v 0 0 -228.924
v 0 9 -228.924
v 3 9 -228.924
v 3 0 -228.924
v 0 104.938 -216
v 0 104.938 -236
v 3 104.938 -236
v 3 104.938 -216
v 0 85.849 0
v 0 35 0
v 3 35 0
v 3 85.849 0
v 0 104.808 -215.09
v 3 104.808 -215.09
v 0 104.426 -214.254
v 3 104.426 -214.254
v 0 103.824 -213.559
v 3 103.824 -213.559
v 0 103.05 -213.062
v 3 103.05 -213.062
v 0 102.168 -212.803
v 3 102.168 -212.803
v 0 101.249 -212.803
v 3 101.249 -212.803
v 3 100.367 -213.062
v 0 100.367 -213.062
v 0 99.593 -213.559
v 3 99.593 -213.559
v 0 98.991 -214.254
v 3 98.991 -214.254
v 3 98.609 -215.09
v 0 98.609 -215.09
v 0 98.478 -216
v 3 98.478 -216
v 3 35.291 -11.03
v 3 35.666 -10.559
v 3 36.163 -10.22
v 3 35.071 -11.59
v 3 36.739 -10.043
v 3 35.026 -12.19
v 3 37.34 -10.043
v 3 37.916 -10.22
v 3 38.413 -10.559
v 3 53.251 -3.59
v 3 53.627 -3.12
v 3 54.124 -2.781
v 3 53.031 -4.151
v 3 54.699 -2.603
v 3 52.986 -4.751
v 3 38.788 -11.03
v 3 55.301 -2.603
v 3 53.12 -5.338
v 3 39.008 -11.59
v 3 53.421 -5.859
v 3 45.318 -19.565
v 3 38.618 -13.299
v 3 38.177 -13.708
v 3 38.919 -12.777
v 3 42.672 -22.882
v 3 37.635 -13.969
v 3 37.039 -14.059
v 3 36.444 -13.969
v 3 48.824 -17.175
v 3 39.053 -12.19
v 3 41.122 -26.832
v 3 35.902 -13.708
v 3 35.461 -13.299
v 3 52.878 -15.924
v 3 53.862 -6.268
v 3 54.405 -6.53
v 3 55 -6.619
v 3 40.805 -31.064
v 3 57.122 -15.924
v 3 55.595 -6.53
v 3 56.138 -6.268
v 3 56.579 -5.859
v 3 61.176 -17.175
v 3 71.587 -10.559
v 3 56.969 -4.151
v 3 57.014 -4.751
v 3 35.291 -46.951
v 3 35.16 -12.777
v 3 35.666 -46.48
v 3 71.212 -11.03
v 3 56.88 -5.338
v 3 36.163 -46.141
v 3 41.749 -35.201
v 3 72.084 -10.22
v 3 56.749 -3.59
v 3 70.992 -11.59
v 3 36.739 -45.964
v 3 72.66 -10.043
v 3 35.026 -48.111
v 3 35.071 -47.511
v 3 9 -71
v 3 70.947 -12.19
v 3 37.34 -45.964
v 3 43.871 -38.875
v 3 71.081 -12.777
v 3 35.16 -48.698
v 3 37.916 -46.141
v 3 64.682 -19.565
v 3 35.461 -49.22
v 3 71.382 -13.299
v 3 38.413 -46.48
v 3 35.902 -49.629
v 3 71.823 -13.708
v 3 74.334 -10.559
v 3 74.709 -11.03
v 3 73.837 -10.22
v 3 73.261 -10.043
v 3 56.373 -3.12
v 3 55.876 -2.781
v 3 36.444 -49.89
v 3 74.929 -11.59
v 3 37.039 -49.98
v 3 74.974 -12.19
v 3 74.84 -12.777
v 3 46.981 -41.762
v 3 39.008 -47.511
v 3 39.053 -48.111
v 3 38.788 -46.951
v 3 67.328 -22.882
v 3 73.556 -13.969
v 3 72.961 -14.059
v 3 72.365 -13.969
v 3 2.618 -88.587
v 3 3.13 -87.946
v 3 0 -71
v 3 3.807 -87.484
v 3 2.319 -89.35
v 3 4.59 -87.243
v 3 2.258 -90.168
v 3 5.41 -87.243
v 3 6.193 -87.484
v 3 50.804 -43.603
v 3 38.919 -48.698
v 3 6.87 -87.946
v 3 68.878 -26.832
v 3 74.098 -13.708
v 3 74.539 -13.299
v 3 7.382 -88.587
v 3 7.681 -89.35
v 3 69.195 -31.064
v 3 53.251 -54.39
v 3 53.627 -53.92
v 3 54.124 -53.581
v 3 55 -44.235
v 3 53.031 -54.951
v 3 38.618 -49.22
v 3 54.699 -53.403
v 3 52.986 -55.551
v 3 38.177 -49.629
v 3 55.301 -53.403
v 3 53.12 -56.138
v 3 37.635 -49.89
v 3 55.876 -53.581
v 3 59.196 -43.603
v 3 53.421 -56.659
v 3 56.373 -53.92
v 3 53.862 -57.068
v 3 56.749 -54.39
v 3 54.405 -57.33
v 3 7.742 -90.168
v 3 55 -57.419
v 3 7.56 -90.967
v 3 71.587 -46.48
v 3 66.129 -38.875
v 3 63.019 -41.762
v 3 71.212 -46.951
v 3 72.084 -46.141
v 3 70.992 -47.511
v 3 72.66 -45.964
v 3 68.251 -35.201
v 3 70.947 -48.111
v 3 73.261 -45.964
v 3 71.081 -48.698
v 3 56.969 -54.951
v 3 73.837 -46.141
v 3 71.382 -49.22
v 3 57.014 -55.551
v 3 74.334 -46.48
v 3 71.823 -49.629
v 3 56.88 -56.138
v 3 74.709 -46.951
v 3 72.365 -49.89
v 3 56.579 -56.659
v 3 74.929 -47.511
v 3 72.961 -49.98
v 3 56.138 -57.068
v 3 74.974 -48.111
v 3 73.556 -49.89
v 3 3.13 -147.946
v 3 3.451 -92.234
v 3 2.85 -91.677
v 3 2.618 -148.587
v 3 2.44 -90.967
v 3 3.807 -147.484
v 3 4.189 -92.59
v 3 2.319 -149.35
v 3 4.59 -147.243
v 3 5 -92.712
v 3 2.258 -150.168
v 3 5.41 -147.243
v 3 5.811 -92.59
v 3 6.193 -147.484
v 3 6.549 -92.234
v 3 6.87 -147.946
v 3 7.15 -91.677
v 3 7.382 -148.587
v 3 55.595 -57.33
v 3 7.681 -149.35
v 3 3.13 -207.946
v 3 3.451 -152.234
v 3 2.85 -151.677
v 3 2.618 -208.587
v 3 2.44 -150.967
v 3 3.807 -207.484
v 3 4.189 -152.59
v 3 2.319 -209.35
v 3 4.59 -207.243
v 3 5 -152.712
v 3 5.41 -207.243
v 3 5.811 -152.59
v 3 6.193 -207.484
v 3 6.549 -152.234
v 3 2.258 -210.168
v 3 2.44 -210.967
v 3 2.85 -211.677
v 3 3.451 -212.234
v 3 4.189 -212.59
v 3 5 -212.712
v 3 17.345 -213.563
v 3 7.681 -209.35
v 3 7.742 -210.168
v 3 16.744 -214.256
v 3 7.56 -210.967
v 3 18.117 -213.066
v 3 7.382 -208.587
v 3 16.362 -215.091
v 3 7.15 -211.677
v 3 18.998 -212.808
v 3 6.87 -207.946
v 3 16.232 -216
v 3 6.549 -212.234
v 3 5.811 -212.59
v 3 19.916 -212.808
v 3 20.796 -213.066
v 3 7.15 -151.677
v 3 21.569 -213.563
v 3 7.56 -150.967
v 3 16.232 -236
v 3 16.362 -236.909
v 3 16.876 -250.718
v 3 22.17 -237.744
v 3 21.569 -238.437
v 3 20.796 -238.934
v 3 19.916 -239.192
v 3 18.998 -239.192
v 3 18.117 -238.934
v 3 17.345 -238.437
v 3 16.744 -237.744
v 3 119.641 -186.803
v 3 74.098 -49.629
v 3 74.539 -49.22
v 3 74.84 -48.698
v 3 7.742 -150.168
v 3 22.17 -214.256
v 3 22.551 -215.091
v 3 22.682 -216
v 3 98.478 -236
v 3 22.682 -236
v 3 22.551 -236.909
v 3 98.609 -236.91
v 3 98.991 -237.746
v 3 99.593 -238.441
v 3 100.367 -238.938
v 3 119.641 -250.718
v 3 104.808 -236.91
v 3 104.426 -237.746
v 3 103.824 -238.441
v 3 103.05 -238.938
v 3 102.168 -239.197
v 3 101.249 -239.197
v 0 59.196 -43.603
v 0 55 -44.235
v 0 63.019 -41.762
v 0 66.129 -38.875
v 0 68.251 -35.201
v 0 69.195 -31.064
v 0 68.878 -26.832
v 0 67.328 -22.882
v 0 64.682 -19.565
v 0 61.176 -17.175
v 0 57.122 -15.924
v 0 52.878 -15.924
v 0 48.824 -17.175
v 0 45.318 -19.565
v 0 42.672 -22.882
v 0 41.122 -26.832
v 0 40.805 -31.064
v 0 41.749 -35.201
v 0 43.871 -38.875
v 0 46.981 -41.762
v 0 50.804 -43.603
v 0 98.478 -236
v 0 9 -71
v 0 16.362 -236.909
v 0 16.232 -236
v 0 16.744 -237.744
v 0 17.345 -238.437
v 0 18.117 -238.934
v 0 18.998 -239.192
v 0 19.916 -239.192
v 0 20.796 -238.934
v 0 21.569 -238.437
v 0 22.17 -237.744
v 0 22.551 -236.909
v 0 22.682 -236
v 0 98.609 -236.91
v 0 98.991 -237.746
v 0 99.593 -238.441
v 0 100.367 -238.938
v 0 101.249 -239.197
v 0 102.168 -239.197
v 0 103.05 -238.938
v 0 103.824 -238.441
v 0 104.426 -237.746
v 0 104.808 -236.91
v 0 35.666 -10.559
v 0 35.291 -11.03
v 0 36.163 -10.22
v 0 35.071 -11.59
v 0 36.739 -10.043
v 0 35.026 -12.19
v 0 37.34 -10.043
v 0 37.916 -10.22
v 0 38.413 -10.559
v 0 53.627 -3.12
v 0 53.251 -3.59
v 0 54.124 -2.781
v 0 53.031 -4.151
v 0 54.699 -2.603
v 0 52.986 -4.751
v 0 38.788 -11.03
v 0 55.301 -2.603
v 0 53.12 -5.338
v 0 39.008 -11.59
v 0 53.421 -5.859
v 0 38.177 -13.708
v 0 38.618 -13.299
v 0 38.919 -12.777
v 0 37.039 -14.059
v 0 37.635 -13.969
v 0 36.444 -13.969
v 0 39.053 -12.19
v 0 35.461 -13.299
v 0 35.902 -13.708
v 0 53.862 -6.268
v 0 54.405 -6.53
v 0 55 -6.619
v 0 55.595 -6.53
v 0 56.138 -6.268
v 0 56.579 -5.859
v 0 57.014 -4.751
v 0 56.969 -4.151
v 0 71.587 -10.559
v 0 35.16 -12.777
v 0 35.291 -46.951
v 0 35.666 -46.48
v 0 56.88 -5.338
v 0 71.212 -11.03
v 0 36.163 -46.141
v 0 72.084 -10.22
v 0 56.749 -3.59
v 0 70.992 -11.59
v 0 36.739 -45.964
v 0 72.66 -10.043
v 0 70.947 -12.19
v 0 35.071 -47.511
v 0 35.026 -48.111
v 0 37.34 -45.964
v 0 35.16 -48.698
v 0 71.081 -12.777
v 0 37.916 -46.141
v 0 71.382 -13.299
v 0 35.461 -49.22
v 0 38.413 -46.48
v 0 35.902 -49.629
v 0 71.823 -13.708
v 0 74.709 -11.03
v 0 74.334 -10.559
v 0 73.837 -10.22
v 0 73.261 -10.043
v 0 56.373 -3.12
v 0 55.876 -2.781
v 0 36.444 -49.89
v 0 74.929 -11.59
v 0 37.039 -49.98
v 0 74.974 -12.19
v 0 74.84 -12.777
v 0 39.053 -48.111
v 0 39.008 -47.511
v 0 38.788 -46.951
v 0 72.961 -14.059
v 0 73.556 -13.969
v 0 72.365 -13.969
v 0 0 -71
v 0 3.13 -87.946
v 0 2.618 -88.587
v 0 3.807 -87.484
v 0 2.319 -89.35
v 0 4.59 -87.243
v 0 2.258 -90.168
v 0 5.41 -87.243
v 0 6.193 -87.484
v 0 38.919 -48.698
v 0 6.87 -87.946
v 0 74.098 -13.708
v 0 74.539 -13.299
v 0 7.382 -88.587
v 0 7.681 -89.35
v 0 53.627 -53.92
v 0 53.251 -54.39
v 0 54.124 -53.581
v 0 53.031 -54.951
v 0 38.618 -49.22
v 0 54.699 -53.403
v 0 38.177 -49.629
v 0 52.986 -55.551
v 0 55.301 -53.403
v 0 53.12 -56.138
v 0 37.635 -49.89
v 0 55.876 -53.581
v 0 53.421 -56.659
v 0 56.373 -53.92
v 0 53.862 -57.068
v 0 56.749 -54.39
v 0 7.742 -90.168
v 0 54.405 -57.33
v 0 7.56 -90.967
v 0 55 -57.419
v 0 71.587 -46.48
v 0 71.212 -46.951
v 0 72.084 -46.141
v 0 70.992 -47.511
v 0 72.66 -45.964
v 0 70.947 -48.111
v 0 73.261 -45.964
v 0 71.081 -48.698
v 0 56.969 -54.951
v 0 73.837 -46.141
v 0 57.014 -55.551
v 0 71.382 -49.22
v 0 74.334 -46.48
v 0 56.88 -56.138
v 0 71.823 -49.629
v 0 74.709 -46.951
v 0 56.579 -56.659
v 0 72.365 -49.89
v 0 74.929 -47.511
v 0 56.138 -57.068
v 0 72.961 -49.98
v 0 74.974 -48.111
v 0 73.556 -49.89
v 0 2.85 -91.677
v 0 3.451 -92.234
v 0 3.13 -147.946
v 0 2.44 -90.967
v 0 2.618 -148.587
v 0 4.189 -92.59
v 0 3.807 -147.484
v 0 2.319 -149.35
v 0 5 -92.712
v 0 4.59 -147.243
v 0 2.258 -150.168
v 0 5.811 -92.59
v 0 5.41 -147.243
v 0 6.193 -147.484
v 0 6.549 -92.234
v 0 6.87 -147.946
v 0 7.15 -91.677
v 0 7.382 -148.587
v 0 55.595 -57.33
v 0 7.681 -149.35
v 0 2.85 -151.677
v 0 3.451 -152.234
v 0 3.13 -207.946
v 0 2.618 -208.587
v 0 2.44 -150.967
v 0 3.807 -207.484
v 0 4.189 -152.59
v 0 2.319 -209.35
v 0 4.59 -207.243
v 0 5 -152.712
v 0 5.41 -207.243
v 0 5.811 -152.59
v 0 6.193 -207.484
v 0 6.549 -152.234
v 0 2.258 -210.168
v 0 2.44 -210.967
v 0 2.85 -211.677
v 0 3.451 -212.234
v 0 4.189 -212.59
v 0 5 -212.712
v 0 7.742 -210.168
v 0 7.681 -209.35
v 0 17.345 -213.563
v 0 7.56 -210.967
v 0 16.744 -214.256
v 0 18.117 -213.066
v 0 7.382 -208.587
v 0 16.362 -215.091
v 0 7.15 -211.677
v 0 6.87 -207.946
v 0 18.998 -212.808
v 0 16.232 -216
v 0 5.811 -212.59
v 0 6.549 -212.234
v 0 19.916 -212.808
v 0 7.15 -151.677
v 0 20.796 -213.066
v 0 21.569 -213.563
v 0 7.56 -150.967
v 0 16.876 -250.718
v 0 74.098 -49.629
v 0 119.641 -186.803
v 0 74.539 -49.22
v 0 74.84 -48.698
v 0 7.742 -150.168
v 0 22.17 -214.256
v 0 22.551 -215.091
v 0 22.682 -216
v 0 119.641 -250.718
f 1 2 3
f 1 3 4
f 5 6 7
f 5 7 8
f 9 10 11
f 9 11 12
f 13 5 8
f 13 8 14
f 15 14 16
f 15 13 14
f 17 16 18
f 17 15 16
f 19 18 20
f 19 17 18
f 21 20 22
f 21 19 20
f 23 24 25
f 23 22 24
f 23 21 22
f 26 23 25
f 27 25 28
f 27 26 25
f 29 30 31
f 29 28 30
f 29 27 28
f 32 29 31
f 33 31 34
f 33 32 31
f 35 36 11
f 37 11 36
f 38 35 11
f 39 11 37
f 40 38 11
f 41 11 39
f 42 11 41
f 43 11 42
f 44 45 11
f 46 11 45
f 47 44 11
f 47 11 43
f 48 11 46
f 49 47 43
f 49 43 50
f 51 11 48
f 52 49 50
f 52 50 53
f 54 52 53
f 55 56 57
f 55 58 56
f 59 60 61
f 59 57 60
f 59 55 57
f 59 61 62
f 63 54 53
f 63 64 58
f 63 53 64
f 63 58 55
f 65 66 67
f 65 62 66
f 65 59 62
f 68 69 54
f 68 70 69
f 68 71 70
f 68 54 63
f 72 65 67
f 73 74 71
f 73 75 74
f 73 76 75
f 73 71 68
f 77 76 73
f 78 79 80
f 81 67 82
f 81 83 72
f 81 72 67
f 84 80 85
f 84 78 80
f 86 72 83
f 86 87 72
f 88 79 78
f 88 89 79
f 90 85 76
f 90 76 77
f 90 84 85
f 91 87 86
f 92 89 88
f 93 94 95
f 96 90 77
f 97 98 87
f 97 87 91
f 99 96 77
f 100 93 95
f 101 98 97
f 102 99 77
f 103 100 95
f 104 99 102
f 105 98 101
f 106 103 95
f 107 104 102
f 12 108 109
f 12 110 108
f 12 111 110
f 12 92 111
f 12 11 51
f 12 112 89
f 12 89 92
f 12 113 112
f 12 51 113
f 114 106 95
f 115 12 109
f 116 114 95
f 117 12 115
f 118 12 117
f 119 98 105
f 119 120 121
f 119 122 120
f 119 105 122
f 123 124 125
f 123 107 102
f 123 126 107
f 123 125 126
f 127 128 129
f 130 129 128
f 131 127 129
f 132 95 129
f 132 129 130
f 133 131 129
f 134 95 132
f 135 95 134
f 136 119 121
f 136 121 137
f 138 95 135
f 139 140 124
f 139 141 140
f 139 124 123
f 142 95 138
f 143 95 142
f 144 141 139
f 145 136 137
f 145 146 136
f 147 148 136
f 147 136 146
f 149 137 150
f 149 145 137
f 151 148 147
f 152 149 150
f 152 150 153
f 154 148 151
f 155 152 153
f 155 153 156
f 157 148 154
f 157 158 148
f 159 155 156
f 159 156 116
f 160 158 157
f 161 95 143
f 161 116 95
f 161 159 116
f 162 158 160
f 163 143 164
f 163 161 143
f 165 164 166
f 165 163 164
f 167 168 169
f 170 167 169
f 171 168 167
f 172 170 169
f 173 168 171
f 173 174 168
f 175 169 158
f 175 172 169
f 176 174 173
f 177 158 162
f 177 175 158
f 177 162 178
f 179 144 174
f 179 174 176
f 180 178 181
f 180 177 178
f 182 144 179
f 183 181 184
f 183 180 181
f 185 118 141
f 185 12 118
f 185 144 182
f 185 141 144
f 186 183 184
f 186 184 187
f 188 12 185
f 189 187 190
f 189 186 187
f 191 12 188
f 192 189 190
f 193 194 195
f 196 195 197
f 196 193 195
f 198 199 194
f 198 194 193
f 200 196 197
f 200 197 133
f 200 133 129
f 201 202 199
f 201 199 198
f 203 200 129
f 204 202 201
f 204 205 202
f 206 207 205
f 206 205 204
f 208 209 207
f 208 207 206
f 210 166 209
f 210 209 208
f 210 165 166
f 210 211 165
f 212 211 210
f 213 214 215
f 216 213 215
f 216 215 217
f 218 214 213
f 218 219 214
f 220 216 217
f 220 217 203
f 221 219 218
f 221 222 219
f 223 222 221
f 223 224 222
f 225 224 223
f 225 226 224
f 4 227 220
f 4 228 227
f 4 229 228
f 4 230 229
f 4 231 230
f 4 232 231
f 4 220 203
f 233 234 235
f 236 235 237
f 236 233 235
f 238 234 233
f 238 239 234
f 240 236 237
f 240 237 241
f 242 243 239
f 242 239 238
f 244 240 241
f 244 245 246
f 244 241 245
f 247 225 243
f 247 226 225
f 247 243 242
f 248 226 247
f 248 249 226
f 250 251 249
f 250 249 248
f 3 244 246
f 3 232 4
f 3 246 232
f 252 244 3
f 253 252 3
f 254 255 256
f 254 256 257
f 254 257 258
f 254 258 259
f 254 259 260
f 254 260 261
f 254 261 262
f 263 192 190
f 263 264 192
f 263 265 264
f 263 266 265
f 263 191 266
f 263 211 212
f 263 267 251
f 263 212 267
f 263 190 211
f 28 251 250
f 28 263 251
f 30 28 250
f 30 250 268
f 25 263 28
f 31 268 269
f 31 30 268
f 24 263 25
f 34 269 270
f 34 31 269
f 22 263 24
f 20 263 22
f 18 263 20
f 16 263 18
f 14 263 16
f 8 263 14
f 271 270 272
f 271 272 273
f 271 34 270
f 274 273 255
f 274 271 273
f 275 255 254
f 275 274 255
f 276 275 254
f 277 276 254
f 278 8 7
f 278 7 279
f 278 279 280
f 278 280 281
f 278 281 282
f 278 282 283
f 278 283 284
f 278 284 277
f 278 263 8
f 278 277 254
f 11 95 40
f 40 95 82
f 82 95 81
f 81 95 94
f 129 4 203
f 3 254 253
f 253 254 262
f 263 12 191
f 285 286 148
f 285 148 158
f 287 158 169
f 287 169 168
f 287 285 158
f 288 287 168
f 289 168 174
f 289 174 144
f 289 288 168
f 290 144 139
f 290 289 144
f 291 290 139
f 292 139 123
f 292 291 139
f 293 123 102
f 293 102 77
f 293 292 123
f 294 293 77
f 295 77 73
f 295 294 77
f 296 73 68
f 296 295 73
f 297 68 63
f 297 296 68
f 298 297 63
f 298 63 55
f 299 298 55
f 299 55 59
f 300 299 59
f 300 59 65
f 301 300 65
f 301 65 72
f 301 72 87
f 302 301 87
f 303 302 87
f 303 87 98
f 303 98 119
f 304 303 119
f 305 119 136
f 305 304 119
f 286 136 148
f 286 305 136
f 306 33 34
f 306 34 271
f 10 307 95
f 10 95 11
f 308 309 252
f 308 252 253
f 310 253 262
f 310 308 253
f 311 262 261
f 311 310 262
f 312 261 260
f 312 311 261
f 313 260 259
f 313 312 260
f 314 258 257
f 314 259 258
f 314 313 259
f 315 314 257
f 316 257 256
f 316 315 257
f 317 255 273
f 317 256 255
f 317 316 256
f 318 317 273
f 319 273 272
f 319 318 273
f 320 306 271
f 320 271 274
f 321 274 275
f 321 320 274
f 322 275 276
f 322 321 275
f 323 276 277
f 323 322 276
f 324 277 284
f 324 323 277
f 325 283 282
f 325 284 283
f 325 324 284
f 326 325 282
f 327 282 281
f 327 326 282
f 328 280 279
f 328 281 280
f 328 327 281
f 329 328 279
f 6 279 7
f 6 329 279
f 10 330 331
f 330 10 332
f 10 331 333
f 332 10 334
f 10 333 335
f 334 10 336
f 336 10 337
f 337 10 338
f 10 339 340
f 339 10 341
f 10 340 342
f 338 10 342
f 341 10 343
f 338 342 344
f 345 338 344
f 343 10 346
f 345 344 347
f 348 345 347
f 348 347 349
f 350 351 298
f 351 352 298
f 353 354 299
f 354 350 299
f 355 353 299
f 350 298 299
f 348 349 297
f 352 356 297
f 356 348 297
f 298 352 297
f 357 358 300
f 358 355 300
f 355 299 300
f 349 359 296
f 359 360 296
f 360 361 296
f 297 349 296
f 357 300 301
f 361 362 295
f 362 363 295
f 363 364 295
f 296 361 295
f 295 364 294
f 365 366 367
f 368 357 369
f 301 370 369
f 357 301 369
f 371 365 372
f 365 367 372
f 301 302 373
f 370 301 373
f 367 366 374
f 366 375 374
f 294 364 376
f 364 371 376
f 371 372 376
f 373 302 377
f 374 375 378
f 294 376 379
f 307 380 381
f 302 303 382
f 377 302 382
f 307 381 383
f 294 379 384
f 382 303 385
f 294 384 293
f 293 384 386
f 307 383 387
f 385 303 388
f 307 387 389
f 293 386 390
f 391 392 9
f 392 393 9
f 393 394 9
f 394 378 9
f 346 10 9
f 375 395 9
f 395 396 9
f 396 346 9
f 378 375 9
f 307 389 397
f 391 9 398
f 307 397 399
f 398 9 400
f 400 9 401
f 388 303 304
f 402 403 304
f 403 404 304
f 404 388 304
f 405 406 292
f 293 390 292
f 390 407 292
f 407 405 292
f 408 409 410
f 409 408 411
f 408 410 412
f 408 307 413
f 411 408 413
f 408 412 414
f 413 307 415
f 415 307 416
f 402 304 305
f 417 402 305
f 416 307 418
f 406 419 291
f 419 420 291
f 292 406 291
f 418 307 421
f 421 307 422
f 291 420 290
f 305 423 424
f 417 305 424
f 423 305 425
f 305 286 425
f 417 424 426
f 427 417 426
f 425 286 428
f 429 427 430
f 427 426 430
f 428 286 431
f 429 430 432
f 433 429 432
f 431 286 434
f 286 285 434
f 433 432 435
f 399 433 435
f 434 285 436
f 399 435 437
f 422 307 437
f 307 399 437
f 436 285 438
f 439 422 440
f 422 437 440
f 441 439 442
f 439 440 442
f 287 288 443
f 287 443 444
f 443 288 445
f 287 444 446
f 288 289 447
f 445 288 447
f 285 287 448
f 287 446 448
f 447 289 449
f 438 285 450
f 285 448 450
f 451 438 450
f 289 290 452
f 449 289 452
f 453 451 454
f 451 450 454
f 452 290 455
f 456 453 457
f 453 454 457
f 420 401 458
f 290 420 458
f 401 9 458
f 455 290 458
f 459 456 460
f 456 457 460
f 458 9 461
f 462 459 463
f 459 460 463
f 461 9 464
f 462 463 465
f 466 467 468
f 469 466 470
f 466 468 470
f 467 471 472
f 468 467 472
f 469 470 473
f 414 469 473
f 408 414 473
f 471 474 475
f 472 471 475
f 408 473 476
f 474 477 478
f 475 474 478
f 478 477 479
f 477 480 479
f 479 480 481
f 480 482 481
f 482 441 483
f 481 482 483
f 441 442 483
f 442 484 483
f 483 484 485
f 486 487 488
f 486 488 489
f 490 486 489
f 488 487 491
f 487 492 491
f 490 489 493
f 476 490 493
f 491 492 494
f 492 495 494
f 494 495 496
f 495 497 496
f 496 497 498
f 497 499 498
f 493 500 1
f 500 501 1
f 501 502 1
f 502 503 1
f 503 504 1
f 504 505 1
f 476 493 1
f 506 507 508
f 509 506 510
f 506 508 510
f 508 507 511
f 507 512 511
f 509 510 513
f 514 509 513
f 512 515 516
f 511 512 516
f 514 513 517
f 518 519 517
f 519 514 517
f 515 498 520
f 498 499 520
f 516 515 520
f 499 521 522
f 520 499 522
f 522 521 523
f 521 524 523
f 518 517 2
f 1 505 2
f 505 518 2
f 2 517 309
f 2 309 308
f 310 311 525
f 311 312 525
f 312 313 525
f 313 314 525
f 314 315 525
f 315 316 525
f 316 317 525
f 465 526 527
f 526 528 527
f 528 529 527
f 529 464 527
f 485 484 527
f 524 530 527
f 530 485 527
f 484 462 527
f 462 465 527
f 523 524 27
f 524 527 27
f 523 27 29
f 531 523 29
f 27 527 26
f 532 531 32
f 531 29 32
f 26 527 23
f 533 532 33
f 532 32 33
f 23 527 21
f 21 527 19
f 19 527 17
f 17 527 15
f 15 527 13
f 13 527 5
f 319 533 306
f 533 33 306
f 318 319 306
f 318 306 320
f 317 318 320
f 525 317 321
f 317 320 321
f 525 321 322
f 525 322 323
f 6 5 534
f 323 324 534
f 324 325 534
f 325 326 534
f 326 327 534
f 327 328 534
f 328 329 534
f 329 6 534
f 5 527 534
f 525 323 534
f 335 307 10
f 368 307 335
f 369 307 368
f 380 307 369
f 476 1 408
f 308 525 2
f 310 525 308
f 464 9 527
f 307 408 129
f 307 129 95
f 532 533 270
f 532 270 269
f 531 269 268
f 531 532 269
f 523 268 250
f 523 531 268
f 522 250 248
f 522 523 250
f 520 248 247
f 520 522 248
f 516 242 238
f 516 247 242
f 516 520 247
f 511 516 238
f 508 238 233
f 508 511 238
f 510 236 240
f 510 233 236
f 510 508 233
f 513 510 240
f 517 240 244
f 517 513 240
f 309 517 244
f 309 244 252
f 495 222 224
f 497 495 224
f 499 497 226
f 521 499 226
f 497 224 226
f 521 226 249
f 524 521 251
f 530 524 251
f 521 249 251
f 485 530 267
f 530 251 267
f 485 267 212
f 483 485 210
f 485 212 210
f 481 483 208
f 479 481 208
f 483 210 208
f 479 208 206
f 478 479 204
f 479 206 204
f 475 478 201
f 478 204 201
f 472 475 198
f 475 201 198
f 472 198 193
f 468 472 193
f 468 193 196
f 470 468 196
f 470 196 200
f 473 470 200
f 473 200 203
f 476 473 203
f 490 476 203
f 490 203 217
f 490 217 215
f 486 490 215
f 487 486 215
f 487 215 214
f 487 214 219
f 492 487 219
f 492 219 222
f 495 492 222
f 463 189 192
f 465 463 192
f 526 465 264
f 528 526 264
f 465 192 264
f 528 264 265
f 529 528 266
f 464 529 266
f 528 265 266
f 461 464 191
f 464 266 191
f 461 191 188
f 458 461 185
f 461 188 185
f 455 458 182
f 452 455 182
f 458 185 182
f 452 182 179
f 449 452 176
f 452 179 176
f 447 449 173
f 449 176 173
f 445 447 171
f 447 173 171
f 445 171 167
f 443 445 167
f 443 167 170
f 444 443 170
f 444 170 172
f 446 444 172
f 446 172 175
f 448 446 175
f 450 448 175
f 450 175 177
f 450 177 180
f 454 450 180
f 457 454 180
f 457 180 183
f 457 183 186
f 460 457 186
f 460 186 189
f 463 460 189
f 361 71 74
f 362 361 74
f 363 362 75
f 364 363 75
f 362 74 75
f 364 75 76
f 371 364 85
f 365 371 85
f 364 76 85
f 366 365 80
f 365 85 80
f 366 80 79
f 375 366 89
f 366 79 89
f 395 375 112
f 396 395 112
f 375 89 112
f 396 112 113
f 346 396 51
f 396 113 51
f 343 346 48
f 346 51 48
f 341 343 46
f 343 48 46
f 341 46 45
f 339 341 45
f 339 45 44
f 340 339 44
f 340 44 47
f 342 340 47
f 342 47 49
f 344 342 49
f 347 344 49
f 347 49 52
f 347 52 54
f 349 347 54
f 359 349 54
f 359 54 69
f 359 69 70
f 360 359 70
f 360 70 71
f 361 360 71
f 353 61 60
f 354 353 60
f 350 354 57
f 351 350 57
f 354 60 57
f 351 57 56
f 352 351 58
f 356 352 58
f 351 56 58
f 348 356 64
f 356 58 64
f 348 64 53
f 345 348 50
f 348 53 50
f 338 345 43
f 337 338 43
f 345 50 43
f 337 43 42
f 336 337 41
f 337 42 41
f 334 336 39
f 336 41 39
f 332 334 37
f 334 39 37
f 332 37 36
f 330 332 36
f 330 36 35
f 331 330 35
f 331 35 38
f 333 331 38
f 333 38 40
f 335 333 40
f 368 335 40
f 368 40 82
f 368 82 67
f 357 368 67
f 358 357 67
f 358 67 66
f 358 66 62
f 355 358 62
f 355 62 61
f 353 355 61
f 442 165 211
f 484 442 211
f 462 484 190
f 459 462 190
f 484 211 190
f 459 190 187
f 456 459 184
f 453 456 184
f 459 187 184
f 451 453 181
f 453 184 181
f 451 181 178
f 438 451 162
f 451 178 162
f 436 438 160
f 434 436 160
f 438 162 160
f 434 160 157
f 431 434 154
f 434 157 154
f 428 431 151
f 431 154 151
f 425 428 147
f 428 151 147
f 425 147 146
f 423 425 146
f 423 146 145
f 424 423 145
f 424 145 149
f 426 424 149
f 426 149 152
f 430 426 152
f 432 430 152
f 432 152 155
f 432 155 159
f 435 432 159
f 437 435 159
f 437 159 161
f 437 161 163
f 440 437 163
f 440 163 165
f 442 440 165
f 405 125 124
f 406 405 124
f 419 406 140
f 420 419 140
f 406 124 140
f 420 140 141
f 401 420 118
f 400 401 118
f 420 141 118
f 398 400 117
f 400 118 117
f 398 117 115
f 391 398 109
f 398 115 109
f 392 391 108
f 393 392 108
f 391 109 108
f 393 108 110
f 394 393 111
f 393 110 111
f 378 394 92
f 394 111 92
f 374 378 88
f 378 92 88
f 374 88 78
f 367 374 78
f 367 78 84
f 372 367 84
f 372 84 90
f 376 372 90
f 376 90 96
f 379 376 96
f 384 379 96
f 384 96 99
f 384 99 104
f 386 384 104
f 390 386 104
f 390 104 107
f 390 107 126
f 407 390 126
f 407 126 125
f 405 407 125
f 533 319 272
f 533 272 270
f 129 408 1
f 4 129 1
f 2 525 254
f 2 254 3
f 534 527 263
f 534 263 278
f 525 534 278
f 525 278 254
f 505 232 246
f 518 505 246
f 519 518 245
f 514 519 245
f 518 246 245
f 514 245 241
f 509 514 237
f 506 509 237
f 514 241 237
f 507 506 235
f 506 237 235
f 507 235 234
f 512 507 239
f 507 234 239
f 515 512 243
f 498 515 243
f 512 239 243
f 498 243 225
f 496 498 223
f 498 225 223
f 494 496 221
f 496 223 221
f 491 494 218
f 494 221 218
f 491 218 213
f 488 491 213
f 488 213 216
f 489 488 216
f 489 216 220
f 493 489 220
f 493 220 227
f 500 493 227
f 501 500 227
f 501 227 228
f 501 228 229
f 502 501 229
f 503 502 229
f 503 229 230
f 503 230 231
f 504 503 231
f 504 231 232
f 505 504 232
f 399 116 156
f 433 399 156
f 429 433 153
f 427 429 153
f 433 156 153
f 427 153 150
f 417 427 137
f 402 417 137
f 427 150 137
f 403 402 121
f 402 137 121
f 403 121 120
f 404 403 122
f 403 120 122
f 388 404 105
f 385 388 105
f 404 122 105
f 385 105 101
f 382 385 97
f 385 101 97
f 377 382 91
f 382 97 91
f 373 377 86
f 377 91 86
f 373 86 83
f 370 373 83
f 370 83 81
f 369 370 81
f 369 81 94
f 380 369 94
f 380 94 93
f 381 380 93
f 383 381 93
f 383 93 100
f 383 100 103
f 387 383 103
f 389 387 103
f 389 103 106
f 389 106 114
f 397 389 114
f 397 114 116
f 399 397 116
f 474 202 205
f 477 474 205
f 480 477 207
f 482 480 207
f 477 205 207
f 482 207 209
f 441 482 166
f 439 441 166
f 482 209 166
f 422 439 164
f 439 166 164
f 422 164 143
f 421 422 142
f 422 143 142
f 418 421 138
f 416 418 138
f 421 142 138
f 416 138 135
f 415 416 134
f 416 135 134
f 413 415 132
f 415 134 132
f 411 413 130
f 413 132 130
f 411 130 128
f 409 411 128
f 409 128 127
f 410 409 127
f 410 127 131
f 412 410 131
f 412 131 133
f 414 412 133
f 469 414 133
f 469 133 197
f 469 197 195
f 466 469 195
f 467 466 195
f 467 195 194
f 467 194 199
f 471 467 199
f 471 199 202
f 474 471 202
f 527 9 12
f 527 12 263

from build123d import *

# Parameters (mm, degrees)
SKETCH1_W           = 300
SKETCH1_H           = 150
SKETCH1_R           = 14.235
BOSS_EXTRUDE1_DEPTH = 3
CUT_EXTRUDE1_REACH  = 5
SKETCH2_R           = 3.225
SKETCH4_R           = 2.0193
CUT_EXTRUDE4_DEPTH  = 4
CUT_EXTRUDE5_DEPTH  = 4
CUT_EXTRUDE6_DEPTH  = 10
SKETCH7_R           = 2.75
CUT_EXTRUDE7_DEPTH  = 4


with BuildPart() as part:
    # Sketch1 → Boss-Extrude1 (new body)
    with BuildSketch(Plane(origin=(0, 0, 0), x_dir=(0, 0, -1), z_dir=(1, 0, 0))):
        with Locations((150, 75)):
            Rectangle(SKETCH1_W, SKETCH1_H)
        with Locations((30, 55)):
            Circle(SKETCH1_R, mode=Mode.SUBTRACT)
    extrude(amount=BOSS_EXTRUDE1_DEPTH)

    # Sketch2 → Cut-Extrude1 (cut, up to next)
    with BuildSketch(Plane.ZY, mode=Mode.PRIVATE) as cut_extrude1_sk1:
        with Locations((-10, 110)):
            Circle(SKETCH2_R)
    cut_extrude1_tool1 = extrude(cut_extrude1_sk1.sketch, amount=-CUT_EXTRUDE1_REACH, mode=Mode.PRIVATE) & part.part
    add(cut_extrude1_tool1.solids().sort_by_distance((0, 110, -10))[0], mode=Mode.SUBTRACT)
    # Sketch2 → Cut-Extrude1 (cut, up to next)
    with BuildSketch(Plane.ZY, mode=Mode.PRIVATE) as cut_extrude1_sk2:
        with BuildLine():
            Line((-236, 104.938413591), (-216, 104.938413591))
            ThreePointArc((-216, 104.938413591), (-212.77, 101.708413591), (-216, 98.478413591))
            Line((-216, 98.478413591), (-236, 98.478413591))
            ThreePointArc((-236, 98.478413591), (-239.23, 101.708413591), (-236, 104.938413591))
        make_face()
    cut_extrude1_tool2 = extrude(cut_extrude1_sk2.sketch, amount=-CUT_EXTRUDE1_REACH, mode=Mode.PRIVATE) & part.part
    add(cut_extrude1_tool2.solids().sort_by_distance((0, 101.708414, -226))[0], mode=Mode.SUBTRACT)
    # Sketch2 → Cut-Extrude1 (cut, up to next)
    with BuildSketch(Plane.ZY, mode=Mode.PRIVATE) as cut_extrude1_sk3:
        with BuildLine():
            Line((-216, 16.231694356), (-236, 16.231694356))
            ThreePointArc((-236, 16.231694356), (-239.225, 19.456694356), (-236, 22.681694356))
            Line((-236, 22.681694356), (-216, 22.681694356))
            ThreePointArc((-216, 22.681694356), (-212.775, 19.456694356), (-216, 16.231694356))
        make_face()
    cut_extrude1_tool3 = extrude(cut_extrude1_sk3.sketch, amount=-CUT_EXTRUDE1_REACH, mode=Mode.PRIVATE) & part.part
    add(cut_extrude1_tool3.solids().sort_by_distance((0, 19.456694, -226))[0], mode=Mode.SUBTRACT)

    # Sketch4 → Cut-Extrude4 (cut, through all)
    with BuildSketch(Plane(origin=(3, 0, 0), x_dir=(0, 0, -1), z_dir=(1, 0, 0))):
        with Locations((12.039487758, 37.039487758)):
            Circle(SKETCH4_R)
        with Locations((12.039487758, 72.960512242)):
            Circle(SKETCH4_R)
        with Locations((4.6, 55)):
            Circle(SKETCH4_R)
        with Locations((47.960512242, 37.039487758)):
            Circle(SKETCH4_R)
        with Locations((55.4, 55)):
            Circle(SKETCH4_R)
        with Locations((47.960512242, 72.960512242)):
            Circle(SKETCH4_R)
    extrude(amount=-CUT_EXTRUDE4_DEPTH, mode=Mode.SUBTRACT)

    # Sketch5 → Cut-Extrude5 (cut, through all)
    with BuildSketch(Plane.ZY):
        Polygon((-71, 0), (-71, 9), (0, 35), (0, 0), align=None)
        Polygon((0, 85.848631797), (-186.802640374, 119.641480316), (-300.310491503, 119.641480316), (-300.310491503, 150), (0, 150), align=None)
    extrude(amount=-CUT_EXTRUDE5_DEPTH, mode=Mode.SUBTRACT)

    # Sketch6 → Cut-Extrude6 (cut)
    with BuildSketch(Plane.ZY):
        Polygon((-250.717958721, 165.712896148), (-250.717958721, 16.875947155), (-228.92403237, 9), (-228.92403237, 0), (-355.768886916, 0), (-364.830865455, 165.712896148), align=None)
    extrude(amount=-CUT_EXTRUDE6_DEPTH, mode=Mode.SUBTRACT)

    # Sketch7 → Cut-Extrude7 (cut, through all)
    with BuildSketch(Plane(origin=(3, 0, 0), x_dir=(0, 0, -1), z_dir=(1, 0, 0))):
        with Locations((89.962016185, 5)):
            Circle(SKETCH7_R)
        with Locations((149.962016185, 5)):
            Circle(SKETCH7_R)
        with Locations((209.962016185, 5)):
            Circle(SKETCH7_R)
    extrude(amount=-CUT_EXTRUDE7_DEPTH, mode=Mode.SUBTRACT)


solid = part.part
